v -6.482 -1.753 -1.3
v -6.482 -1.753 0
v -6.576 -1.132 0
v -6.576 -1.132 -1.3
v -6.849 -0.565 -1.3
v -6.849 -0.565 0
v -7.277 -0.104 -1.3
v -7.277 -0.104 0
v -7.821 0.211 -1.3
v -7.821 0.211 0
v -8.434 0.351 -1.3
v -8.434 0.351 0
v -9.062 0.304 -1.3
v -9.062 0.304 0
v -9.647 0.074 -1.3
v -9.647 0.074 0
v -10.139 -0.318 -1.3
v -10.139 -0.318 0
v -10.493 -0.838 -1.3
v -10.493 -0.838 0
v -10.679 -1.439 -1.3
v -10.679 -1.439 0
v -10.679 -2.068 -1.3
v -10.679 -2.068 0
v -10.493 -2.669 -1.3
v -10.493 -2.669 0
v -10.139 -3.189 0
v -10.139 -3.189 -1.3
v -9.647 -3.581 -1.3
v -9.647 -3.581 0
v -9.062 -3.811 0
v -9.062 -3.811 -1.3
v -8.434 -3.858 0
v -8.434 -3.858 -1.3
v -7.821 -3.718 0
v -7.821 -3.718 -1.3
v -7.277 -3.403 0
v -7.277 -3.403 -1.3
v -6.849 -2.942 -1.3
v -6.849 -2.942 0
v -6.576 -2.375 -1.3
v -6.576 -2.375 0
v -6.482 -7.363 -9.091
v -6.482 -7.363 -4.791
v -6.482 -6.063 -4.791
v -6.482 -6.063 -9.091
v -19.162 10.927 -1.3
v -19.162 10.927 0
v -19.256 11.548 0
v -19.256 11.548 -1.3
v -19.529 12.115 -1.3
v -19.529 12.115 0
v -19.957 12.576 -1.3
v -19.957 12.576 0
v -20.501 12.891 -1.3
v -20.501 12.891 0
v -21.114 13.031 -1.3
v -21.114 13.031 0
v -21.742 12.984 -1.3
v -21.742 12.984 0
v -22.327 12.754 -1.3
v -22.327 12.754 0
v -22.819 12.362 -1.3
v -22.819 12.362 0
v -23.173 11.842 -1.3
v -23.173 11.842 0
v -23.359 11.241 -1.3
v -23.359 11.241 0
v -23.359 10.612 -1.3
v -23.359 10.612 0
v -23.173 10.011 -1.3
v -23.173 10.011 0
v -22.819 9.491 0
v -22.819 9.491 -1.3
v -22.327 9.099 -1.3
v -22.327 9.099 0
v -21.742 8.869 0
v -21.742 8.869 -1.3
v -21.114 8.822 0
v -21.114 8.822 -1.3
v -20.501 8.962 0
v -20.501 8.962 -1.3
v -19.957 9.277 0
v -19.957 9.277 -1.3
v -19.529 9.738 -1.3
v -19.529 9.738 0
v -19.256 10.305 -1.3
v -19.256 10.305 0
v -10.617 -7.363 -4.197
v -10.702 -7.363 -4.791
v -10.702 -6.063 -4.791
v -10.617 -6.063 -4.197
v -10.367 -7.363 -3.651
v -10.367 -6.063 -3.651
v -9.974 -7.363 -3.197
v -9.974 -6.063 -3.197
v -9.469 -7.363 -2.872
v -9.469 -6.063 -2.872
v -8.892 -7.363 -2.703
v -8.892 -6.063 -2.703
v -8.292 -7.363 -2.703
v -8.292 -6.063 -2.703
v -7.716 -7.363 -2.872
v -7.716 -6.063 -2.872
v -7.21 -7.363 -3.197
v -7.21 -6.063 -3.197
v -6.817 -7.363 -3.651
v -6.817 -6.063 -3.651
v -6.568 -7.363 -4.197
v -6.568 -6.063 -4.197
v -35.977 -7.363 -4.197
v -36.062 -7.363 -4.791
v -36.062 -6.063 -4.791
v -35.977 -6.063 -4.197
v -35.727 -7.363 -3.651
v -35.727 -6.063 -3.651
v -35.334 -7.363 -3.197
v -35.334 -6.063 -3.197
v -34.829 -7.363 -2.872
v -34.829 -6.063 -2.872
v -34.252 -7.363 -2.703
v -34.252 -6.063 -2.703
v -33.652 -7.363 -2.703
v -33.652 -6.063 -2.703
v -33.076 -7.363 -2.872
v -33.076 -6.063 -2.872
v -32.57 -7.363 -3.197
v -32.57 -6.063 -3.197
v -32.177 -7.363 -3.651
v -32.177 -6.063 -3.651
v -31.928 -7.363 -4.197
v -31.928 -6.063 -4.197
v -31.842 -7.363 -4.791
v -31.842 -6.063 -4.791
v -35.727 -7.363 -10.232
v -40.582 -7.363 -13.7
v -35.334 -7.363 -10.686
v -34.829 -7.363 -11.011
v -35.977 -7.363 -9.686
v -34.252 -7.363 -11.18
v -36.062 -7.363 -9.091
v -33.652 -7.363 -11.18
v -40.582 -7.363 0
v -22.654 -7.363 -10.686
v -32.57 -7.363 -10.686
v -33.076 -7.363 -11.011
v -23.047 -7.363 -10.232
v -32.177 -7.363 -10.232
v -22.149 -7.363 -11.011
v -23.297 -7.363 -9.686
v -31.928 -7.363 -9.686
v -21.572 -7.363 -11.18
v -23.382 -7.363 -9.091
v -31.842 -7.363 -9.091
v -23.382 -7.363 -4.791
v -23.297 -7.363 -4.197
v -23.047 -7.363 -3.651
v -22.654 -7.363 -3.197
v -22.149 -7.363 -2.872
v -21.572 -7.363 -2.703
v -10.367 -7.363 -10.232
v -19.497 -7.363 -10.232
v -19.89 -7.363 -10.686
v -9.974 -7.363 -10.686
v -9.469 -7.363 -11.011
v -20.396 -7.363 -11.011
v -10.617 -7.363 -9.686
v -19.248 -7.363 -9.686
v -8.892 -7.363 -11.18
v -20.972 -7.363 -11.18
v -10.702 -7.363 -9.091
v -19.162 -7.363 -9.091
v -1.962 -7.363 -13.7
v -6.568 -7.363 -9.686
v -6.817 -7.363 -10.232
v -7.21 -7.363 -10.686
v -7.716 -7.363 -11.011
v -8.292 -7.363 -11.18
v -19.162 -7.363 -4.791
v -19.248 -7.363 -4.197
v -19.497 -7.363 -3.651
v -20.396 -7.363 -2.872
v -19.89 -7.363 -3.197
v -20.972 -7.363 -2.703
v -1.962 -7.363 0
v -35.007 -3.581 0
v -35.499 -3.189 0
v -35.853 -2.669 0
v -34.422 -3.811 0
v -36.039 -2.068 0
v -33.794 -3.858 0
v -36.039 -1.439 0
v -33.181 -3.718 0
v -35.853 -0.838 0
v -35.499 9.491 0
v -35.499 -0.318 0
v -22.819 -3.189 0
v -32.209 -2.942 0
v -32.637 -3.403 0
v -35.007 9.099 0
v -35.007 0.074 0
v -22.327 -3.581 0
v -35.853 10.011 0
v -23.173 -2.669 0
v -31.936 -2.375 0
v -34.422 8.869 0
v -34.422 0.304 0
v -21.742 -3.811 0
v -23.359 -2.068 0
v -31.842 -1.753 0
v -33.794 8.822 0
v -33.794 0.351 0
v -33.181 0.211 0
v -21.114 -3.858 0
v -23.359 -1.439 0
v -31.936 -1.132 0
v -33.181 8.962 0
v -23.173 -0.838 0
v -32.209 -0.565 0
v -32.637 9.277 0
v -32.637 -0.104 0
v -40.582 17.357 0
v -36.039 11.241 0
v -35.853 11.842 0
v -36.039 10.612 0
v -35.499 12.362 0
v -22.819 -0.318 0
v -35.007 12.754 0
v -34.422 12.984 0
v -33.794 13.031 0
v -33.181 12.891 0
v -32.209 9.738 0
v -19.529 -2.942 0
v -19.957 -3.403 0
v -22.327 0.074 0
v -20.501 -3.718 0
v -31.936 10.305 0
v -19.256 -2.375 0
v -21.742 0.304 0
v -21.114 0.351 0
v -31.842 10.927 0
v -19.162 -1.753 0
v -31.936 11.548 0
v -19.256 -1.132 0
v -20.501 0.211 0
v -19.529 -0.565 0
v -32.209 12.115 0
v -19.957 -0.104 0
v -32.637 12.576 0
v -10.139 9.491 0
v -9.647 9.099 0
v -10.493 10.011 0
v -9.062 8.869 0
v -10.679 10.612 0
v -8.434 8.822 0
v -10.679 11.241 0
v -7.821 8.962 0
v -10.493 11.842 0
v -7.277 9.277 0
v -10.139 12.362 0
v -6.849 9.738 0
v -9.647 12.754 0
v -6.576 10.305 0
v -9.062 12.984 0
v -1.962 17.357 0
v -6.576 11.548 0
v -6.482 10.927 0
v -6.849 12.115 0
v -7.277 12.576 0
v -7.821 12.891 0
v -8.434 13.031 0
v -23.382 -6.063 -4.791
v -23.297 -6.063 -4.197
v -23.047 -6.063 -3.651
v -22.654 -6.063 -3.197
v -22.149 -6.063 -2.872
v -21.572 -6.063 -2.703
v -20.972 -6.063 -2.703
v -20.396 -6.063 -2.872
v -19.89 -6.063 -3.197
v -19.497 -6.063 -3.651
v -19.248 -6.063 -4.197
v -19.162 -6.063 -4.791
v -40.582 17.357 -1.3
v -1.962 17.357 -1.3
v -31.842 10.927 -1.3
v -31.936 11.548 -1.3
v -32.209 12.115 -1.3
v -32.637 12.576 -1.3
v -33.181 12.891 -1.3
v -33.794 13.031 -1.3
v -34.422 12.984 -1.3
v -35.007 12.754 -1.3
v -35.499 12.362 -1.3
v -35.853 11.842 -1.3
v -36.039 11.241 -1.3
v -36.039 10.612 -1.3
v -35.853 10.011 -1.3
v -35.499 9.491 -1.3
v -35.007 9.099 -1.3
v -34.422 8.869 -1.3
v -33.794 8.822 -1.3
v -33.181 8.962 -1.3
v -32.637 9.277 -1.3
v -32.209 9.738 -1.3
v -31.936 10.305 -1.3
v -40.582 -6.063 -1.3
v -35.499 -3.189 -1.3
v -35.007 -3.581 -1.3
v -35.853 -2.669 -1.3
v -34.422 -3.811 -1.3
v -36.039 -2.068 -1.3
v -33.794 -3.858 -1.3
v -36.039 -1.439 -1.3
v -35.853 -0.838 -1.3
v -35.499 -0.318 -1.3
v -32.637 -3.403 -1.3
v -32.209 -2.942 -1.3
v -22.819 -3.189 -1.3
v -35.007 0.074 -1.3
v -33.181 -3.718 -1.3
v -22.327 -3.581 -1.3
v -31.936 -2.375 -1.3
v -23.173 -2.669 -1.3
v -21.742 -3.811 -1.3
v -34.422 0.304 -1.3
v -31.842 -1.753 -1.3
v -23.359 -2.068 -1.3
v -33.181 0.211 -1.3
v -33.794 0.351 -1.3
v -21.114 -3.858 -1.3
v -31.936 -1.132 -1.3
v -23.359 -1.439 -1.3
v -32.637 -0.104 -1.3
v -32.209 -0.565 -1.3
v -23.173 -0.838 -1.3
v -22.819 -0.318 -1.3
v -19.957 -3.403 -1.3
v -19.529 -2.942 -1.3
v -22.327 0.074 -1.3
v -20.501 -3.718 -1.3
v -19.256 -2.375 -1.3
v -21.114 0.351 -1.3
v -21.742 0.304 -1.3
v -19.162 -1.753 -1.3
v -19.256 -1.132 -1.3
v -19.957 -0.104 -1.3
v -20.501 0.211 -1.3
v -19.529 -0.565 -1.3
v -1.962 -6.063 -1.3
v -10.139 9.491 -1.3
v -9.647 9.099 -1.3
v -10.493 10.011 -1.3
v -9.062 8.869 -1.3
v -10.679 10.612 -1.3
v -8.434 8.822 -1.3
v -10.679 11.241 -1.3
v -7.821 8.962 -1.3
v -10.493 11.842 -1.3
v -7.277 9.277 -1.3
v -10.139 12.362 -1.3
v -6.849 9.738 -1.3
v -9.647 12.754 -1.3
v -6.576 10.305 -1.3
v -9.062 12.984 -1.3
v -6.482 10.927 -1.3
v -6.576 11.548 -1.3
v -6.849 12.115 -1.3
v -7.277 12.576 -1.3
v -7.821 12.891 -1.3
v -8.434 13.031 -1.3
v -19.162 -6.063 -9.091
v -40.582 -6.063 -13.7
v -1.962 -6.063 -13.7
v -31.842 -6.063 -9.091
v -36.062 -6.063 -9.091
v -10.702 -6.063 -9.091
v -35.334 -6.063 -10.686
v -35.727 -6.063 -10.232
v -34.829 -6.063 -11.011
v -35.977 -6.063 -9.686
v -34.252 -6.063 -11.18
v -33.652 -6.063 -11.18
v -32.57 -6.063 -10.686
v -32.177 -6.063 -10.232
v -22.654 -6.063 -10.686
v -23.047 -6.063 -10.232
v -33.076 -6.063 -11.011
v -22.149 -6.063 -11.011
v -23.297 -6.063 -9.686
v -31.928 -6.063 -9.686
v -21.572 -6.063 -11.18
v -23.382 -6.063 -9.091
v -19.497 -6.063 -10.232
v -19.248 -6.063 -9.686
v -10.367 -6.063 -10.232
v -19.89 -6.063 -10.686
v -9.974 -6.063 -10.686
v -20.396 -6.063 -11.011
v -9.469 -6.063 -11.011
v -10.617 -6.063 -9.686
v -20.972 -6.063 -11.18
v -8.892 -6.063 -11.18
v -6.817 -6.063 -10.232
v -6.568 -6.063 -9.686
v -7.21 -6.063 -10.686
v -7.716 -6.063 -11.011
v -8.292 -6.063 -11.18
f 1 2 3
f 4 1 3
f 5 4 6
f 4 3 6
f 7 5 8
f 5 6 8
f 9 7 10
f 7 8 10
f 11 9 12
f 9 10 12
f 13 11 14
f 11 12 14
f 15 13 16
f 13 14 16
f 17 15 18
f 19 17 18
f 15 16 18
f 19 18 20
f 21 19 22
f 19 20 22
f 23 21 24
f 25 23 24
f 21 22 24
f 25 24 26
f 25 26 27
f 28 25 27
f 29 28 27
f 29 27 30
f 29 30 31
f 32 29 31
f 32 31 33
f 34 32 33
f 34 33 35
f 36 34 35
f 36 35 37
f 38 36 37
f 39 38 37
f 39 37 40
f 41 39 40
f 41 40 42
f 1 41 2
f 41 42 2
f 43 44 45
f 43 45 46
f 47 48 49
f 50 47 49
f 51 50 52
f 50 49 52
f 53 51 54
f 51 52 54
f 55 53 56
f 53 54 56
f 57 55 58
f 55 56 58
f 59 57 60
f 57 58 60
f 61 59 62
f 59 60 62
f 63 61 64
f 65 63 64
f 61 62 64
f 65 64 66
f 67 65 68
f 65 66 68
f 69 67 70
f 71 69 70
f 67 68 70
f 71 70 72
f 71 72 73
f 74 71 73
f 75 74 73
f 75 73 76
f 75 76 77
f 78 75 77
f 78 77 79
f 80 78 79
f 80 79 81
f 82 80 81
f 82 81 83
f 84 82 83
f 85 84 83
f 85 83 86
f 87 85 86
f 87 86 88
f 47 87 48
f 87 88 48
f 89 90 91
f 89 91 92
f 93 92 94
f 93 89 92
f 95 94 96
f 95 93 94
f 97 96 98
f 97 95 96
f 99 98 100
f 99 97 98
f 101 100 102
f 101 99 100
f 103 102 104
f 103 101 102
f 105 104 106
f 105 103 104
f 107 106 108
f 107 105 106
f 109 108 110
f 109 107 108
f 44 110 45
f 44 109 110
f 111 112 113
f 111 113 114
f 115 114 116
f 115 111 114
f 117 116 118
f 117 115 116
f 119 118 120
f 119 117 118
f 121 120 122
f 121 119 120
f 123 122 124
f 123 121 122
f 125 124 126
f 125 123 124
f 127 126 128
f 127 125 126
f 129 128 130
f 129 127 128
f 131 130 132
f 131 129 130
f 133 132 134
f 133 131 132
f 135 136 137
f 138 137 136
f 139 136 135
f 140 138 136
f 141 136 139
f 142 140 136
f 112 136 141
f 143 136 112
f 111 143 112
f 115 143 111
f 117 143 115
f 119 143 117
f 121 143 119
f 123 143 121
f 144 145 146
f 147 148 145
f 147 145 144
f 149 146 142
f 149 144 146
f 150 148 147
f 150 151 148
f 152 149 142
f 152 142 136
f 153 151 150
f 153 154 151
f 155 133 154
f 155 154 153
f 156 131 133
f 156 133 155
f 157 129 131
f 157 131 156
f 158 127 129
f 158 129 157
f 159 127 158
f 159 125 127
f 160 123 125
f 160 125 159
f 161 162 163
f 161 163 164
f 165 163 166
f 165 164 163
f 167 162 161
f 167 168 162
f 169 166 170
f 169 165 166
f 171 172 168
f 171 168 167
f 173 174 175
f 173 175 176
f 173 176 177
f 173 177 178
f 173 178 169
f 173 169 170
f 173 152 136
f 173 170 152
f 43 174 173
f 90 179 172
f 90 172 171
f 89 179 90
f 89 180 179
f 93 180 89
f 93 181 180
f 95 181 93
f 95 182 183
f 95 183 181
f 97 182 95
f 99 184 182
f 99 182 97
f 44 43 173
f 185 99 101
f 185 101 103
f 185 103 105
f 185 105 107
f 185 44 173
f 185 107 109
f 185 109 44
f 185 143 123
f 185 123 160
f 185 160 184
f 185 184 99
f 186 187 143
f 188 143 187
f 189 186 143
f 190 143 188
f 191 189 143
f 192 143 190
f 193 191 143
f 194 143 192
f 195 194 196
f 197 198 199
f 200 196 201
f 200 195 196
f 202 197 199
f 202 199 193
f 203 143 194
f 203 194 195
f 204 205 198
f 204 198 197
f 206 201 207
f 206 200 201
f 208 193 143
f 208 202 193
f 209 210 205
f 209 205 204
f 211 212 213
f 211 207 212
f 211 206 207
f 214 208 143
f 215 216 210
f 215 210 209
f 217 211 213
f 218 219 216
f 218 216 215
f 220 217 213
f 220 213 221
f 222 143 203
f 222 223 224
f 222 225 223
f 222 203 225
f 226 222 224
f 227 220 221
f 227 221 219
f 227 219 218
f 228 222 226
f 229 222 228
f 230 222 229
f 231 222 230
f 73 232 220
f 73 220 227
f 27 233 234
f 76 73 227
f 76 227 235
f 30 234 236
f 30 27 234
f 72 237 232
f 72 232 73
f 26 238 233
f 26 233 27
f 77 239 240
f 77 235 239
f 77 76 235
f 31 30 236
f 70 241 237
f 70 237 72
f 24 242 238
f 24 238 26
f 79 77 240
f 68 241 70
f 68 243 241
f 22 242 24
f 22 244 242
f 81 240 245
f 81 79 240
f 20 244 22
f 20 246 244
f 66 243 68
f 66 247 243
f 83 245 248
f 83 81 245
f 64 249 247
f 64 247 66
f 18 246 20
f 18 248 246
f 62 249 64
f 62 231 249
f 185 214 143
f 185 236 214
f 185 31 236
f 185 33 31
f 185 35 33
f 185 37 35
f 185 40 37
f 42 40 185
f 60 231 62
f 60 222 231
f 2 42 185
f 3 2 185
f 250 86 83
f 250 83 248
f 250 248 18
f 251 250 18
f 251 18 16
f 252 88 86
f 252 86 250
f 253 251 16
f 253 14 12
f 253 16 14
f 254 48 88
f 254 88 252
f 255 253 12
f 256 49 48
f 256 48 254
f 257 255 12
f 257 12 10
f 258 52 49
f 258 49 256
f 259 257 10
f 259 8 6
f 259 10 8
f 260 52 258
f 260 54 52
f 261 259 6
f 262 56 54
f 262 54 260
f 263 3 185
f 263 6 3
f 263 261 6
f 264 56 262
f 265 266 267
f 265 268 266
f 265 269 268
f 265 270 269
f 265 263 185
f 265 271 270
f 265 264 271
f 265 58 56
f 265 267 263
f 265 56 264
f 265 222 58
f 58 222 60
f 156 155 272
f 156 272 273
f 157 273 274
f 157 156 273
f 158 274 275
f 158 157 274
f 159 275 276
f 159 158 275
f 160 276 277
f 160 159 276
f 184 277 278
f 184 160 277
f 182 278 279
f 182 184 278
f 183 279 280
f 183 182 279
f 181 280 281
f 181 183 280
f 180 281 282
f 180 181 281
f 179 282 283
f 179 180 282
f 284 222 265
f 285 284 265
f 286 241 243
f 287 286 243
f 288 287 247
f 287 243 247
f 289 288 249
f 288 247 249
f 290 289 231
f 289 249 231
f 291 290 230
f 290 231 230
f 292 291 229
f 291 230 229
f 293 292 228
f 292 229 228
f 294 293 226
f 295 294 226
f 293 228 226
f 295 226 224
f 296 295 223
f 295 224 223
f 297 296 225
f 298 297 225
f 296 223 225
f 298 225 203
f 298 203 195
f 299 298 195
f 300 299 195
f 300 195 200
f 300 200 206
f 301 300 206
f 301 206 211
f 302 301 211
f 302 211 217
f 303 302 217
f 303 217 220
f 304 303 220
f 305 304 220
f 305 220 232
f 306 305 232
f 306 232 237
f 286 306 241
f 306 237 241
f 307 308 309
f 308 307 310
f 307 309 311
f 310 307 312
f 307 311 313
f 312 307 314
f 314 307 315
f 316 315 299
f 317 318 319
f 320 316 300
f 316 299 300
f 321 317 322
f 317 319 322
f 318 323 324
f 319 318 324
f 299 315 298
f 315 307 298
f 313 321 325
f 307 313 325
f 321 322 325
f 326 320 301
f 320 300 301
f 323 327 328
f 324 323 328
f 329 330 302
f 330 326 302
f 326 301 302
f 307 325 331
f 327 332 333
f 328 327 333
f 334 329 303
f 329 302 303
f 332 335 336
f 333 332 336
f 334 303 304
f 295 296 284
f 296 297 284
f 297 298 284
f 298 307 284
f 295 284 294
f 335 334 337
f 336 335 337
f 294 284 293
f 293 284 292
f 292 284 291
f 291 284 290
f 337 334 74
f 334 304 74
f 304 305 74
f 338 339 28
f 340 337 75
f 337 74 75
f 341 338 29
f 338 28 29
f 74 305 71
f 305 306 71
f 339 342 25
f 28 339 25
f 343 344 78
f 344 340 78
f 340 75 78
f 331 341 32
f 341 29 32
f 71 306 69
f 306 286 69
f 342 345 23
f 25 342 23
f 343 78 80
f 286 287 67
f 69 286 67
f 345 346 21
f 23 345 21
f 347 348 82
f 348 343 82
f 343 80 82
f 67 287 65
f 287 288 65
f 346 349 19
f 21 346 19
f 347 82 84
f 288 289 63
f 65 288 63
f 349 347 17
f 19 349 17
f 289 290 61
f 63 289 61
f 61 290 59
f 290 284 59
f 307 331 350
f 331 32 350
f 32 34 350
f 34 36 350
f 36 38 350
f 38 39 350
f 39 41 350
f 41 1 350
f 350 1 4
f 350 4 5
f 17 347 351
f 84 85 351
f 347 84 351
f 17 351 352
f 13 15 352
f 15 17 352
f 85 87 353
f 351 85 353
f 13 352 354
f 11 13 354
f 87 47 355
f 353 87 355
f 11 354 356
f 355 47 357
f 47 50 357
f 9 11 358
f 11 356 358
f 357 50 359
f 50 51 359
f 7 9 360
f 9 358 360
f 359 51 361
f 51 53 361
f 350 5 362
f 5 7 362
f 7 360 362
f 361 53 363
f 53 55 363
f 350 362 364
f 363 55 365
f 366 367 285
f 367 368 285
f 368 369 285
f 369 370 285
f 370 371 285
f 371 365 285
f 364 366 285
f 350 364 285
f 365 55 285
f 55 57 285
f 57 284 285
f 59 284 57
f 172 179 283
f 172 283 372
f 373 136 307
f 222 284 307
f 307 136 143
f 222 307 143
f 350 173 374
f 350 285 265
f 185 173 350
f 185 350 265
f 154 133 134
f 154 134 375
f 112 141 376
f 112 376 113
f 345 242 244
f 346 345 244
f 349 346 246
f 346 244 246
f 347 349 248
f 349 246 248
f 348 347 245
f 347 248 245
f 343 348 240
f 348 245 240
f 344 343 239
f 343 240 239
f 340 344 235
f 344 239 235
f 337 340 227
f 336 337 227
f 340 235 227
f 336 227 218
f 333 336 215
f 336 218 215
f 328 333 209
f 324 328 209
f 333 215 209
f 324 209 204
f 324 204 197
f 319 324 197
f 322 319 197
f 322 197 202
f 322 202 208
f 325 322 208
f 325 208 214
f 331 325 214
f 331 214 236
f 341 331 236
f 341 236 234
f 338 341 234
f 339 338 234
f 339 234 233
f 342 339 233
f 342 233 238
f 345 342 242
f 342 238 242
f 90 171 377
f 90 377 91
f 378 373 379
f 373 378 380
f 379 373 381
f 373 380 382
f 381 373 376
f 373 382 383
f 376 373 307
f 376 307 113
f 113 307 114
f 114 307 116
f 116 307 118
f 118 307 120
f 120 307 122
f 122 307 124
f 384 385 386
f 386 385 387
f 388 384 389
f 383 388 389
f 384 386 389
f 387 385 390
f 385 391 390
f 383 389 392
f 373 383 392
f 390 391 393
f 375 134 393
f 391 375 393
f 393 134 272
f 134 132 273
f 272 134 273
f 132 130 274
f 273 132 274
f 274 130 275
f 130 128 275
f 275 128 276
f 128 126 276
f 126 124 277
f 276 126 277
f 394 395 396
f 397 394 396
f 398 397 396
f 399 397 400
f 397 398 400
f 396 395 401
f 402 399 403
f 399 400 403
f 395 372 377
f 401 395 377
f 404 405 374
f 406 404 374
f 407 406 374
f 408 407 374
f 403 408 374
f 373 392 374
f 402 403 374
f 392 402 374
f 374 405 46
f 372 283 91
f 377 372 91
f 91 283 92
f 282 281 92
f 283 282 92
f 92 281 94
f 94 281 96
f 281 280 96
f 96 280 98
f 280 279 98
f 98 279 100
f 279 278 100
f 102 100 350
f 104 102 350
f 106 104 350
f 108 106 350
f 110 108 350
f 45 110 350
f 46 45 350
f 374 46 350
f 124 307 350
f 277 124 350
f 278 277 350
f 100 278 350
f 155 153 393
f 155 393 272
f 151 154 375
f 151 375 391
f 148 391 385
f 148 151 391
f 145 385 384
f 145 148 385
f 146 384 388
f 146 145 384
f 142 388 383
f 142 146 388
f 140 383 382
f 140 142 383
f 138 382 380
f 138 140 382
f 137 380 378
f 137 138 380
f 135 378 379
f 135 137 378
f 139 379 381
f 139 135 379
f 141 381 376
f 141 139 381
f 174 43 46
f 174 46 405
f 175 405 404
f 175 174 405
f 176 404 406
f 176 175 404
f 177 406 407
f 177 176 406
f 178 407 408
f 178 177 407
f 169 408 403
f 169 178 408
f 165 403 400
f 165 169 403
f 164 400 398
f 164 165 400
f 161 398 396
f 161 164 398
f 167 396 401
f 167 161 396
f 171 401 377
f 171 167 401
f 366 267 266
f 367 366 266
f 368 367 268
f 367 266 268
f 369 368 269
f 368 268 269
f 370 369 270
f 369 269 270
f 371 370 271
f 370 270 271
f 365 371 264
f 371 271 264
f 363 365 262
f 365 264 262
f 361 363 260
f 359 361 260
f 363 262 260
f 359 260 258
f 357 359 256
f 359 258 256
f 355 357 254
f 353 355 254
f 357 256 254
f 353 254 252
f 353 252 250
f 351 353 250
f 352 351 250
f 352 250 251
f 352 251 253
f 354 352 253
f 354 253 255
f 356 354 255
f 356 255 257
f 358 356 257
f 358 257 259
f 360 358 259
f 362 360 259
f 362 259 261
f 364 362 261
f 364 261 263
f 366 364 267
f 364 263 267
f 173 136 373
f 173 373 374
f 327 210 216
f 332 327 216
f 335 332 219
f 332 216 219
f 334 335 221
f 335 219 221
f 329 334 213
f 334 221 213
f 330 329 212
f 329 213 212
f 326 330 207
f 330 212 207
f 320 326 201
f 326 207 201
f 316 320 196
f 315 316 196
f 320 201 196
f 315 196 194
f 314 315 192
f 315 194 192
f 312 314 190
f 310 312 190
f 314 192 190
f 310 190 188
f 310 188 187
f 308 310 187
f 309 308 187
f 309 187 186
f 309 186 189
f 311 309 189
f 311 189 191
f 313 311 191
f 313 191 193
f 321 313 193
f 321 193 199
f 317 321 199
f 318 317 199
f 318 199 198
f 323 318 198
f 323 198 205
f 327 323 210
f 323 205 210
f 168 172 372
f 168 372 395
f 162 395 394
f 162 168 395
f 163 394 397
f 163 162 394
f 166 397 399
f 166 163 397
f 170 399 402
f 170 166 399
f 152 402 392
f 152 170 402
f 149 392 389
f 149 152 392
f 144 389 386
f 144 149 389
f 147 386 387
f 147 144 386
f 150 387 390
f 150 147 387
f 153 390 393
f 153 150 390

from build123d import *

# Parameters (mm, degrees)
SKETCH1_W           = 38.62
SKETCH1_H           = 24.72
SKETCH1_R           = 2.11
BOSS_EXTRUDE1_DEPTH = 1.3
SKETCH2_W           = 38.62
SKETCH2_H           = 13.7
BOSS_EXTRUDE2_DEPTH = 1.3


with BuildPart() as part:
    # Sketch1 → Boss-Extrude1 (new body)
    with BuildSketch(Plane.XY):
        with Locations((-21.272112536, 4.996529857)):
            Rectangle(SKETCH1_W, SKETCH1_H)
        with Locations((-33.952112536, 10.926529857)):
            Circle(SKETCH1_R, mode=Mode.SUBTRACT)
        with Locations((-21.272112536, 10.926529857)):
            Circle(SKETCH1_R, mode=Mode.SUBTRACT)
        with Locations((-8.592112536, 10.926529857)):
            Circle(SKETCH1_R, mode=Mode.SUBTRACT)
        with Locations((-21.272112536, -1.753470143)):
            Circle(SKETCH1_R, mode=Mode.SUBTRACT)
        with Locations((-8.592112536, -1.753470143)):
            Circle(SKETCH1_R, mode=Mode.SUBTRACT)
        with Locations((-33.952112536, -1.753470143)):
            Circle(SKETCH1_R, mode=Mode.SUBTRACT)
    extrude(amount=-BOSS_EXTRUDE1_DEPTH)

    # Sketch2 → Boss-Extrude2 (add)
    with BuildSketch(Plane.XZ.offset(7.363470143)):
        with Locations((-21.272112536, -6.85)):
            Rectangle(SKETCH2_W, SKETCH2_H)
        with BuildLine():
            Line((-31.842112536, -4.791404459), (-31.842112536, -9.091404459))
            ThreePointArc((-31.842112536, -9.091404459), (-33.952112536, -11.201404459), (-36.062112536, -9.091404459))
            Line((-36.062112536, -9.091404459), (-36.062112536, -4.791404459))
            ThreePointArc((-36.062112536, -4.791404459), (-33.952112536, -2.681404459), (-31.842112536, -4.791404459))
        make_face(mode=Mode.SUBTRACT)
        with BuildLine():
            Line((-19.162112536, -4.791404459), (-19.162112536, -9.091404459))
            ThreePointArc((-19.162112536, -9.091404459), (-21.272112536, -11.201404459), (-23.382112536, -9.091404459))
            Line((-23.382112536, -9.091404459), (-23.382112536, -4.791404459))
            ThreePointArc((-23.382112536, -4.791404459), (-21.272112536, -2.681404459), (-19.162112536, -4.791404459))
        make_face(mode=Mode.SUBTRACT)
        with BuildLine():
            Line((-6.482112536, -4.791404459), (-6.482112536, -9.091404459))
            ThreePointArc((-6.482112536, -9.091404459), (-8.592112536, -11.201404459), (-10.702112536, -9.091404459))
            Line((-10.702112536, -9.091404459), (-10.702112536, -4.791404459))
            ThreePointArc((-10.702112536, -4.791404459), (-8.592112536, -2.681404459), (-6.482112536, -4.791404459))
        make_face(mode=Mode.SUBTRACT)
    extrude(amount=-BOSS_EXTRUDE2_DEPTH)


solid = part.part
